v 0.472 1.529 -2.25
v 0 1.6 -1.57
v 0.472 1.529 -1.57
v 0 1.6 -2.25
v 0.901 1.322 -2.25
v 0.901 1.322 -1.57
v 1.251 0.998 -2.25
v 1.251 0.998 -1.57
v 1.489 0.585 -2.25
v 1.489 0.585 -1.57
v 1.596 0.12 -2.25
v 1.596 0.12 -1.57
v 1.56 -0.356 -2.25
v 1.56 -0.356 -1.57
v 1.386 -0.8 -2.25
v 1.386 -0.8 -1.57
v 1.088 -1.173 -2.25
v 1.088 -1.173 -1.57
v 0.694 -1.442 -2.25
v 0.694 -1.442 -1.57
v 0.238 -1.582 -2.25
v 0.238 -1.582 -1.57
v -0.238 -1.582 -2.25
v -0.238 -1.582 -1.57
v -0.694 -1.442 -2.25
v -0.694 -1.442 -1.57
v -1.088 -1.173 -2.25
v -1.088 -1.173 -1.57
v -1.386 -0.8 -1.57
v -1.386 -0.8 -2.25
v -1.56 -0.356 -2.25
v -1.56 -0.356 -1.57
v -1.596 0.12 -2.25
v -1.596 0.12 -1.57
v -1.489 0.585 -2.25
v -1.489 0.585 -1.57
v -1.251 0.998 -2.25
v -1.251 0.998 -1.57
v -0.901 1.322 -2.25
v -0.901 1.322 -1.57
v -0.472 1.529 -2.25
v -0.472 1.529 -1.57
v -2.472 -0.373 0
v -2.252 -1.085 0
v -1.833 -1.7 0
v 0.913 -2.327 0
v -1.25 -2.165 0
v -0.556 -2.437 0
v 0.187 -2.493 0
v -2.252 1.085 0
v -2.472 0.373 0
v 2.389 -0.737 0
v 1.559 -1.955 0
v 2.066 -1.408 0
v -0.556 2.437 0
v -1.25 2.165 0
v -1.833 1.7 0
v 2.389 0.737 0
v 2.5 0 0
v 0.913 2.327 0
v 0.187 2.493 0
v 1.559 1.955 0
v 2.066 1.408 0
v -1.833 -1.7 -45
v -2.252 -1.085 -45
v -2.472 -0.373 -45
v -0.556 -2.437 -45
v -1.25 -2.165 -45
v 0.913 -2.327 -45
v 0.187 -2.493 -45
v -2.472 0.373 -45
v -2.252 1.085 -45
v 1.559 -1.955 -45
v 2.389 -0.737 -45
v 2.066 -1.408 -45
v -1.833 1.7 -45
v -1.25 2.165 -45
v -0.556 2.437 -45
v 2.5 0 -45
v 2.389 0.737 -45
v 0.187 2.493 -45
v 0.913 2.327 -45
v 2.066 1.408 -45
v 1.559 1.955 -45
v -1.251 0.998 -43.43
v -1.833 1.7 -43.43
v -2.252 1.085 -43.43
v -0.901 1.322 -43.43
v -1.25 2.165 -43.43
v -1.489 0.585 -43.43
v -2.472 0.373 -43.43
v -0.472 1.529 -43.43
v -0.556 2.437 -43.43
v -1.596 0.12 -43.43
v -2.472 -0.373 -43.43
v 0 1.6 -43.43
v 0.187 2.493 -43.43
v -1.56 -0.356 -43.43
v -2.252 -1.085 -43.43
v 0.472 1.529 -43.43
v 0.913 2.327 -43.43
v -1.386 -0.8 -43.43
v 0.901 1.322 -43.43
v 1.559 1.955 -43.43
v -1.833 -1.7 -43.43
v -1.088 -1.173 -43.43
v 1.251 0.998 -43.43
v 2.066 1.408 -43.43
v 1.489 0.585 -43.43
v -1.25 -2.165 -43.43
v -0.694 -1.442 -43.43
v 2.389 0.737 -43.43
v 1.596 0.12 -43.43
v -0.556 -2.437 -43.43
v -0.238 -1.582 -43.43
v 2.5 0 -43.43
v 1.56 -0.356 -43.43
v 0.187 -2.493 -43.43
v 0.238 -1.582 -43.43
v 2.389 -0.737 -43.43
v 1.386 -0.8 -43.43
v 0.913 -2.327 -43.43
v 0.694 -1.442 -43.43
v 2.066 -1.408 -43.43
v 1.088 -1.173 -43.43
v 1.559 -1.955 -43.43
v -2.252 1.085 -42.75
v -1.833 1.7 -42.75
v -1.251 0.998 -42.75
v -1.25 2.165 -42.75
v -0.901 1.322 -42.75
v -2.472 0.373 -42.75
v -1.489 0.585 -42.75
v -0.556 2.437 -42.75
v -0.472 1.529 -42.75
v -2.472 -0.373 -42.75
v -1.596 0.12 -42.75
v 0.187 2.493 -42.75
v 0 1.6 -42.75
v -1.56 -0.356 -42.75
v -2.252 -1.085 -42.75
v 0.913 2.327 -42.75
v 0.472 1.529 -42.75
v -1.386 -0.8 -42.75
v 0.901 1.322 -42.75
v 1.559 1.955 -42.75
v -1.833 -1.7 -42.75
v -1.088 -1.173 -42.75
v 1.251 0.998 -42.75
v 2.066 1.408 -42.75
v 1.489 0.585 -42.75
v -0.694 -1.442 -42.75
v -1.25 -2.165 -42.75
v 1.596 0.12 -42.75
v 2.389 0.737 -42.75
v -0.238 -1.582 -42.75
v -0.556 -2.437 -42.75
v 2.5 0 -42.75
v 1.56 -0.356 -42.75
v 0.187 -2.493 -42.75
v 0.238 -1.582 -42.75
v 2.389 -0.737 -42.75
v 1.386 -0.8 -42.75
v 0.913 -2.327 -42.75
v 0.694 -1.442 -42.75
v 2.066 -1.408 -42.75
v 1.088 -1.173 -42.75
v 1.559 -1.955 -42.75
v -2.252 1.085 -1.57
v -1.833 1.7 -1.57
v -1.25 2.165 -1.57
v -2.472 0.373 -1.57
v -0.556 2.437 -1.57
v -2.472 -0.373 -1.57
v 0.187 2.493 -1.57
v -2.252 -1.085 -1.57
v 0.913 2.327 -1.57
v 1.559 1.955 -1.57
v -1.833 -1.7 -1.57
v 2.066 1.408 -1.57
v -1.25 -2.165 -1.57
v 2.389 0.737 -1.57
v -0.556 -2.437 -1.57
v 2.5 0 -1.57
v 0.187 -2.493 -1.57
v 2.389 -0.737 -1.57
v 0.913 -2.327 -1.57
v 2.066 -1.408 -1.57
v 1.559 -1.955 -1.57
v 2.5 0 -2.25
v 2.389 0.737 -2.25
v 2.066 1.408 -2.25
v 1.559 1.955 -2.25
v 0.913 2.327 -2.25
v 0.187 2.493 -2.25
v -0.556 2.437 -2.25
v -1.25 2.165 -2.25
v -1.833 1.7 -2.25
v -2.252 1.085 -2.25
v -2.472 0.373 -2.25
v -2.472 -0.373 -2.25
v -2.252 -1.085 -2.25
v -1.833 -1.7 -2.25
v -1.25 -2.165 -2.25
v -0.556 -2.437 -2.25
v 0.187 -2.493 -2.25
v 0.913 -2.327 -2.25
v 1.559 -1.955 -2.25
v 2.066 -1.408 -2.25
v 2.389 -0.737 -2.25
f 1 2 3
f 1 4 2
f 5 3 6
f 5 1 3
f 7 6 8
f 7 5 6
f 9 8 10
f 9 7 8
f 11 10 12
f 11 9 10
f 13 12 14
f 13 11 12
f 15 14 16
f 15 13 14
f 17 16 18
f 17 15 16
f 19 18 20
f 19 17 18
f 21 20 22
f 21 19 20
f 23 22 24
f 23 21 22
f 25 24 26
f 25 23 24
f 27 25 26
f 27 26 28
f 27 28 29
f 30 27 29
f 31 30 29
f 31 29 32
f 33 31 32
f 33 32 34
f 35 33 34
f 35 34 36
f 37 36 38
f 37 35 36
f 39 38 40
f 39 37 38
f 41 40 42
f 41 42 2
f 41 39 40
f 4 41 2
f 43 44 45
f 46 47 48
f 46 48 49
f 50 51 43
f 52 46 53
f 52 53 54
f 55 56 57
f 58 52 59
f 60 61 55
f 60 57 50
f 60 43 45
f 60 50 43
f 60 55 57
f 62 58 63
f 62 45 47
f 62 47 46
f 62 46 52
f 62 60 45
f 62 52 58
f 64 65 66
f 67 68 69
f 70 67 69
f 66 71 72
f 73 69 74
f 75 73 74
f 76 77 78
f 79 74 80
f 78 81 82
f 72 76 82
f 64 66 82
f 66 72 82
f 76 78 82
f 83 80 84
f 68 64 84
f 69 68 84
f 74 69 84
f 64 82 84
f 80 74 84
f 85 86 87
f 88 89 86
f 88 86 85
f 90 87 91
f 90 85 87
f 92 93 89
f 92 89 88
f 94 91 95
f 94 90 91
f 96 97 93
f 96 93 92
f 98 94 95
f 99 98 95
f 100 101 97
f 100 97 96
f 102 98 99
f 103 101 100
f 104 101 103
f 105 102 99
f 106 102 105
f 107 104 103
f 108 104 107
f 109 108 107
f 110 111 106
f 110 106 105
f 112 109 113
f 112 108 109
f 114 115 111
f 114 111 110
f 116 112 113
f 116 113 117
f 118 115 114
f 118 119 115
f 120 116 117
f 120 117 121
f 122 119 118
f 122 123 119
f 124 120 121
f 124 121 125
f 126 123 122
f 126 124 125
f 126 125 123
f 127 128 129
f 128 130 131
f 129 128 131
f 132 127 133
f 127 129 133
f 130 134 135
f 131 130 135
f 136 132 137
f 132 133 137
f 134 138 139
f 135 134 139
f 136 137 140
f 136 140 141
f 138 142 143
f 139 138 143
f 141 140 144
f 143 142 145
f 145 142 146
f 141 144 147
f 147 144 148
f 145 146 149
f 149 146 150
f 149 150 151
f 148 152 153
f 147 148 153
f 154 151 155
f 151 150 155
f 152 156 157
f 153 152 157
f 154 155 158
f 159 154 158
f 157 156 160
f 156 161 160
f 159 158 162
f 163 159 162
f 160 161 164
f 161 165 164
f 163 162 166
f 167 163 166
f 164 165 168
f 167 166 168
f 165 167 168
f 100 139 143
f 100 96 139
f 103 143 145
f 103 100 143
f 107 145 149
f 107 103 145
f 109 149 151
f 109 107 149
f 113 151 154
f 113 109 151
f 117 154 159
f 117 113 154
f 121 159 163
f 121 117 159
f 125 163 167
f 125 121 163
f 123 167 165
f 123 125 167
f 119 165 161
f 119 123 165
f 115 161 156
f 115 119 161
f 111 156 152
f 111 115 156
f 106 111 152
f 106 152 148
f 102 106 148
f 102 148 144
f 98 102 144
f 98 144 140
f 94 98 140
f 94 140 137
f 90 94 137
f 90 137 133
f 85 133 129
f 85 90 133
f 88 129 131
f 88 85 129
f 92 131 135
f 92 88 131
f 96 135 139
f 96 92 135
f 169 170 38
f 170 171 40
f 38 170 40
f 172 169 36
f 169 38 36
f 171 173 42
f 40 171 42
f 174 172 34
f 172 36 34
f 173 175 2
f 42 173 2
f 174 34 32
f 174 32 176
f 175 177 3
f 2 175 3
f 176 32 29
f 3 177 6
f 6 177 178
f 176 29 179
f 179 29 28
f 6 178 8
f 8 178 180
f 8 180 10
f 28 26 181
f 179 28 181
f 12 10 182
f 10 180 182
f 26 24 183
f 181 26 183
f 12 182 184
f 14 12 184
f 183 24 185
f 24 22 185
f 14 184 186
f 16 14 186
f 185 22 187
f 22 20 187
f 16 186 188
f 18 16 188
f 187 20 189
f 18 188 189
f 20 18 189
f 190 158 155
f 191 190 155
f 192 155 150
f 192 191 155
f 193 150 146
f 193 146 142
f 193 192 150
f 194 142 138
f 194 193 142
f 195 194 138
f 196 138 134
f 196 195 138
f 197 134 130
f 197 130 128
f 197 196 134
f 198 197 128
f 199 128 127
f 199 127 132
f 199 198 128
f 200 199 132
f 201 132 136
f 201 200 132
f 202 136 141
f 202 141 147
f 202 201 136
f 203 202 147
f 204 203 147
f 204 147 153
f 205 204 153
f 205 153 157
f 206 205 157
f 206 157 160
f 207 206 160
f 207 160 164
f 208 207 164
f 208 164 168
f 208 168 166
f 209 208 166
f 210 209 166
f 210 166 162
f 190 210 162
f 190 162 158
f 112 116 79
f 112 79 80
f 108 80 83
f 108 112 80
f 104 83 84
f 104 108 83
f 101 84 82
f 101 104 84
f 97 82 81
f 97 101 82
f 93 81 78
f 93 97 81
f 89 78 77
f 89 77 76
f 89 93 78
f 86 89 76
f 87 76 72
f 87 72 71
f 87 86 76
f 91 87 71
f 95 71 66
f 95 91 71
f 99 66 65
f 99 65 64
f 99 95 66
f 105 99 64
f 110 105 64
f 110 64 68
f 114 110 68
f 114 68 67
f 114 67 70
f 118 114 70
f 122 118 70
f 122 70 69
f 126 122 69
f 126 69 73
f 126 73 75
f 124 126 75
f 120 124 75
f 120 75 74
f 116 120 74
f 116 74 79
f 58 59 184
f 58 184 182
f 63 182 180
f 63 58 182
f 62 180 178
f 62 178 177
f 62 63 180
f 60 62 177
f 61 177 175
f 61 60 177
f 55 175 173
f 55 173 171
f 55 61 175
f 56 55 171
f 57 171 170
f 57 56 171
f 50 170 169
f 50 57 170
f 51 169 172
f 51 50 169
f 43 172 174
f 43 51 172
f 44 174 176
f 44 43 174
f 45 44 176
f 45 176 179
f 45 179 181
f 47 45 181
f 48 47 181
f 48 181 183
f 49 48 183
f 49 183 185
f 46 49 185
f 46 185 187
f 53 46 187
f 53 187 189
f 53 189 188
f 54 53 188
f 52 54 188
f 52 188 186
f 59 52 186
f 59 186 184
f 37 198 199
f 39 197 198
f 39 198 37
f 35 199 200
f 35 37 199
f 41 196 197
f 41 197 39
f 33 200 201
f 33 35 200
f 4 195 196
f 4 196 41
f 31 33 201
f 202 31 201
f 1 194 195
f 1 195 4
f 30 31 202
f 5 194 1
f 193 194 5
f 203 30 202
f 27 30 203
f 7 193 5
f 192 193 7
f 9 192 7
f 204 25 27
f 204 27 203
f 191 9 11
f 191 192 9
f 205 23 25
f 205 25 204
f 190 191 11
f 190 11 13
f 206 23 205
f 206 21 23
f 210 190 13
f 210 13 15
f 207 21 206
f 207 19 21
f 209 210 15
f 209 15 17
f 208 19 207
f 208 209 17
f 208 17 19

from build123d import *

# Parameters (mm, degrees)
SKETCH1_R           = 2.5
BOSS_EXTRUDE1_DEPTH = 45
SKETCH2_W           = 0.68
SKETCH2_H           = 0.9


with BuildPart() as part:
    # Sketch1 → Boss-Extrude1 (new body)
    with BuildSketch(Plane.XY):
        Circle(SKETCH1_R)
    extrude(amount=-BOSS_EXTRUDE1_DEPTH)

    # Sketch2 → Cut-Revolve1 (revolve, cut)
    with BuildSketch(Plane(origin=(0, 0, 0), x_dir=(0, 0, -1), z_dir=(1, 0, 0))):
        with Locations((1.91, 2.05)):
            Rectangle(SKETCH2_W, SKETCH2_H)
        with Locations((43.09, 2.05)):
            Rectangle(SKETCH2_W, SKETCH2_H)
    revolve(axis=Axis((0, 0, 0), (0, 0, -1)), mode=Mode.SUBTRACT)


solid = part.part
